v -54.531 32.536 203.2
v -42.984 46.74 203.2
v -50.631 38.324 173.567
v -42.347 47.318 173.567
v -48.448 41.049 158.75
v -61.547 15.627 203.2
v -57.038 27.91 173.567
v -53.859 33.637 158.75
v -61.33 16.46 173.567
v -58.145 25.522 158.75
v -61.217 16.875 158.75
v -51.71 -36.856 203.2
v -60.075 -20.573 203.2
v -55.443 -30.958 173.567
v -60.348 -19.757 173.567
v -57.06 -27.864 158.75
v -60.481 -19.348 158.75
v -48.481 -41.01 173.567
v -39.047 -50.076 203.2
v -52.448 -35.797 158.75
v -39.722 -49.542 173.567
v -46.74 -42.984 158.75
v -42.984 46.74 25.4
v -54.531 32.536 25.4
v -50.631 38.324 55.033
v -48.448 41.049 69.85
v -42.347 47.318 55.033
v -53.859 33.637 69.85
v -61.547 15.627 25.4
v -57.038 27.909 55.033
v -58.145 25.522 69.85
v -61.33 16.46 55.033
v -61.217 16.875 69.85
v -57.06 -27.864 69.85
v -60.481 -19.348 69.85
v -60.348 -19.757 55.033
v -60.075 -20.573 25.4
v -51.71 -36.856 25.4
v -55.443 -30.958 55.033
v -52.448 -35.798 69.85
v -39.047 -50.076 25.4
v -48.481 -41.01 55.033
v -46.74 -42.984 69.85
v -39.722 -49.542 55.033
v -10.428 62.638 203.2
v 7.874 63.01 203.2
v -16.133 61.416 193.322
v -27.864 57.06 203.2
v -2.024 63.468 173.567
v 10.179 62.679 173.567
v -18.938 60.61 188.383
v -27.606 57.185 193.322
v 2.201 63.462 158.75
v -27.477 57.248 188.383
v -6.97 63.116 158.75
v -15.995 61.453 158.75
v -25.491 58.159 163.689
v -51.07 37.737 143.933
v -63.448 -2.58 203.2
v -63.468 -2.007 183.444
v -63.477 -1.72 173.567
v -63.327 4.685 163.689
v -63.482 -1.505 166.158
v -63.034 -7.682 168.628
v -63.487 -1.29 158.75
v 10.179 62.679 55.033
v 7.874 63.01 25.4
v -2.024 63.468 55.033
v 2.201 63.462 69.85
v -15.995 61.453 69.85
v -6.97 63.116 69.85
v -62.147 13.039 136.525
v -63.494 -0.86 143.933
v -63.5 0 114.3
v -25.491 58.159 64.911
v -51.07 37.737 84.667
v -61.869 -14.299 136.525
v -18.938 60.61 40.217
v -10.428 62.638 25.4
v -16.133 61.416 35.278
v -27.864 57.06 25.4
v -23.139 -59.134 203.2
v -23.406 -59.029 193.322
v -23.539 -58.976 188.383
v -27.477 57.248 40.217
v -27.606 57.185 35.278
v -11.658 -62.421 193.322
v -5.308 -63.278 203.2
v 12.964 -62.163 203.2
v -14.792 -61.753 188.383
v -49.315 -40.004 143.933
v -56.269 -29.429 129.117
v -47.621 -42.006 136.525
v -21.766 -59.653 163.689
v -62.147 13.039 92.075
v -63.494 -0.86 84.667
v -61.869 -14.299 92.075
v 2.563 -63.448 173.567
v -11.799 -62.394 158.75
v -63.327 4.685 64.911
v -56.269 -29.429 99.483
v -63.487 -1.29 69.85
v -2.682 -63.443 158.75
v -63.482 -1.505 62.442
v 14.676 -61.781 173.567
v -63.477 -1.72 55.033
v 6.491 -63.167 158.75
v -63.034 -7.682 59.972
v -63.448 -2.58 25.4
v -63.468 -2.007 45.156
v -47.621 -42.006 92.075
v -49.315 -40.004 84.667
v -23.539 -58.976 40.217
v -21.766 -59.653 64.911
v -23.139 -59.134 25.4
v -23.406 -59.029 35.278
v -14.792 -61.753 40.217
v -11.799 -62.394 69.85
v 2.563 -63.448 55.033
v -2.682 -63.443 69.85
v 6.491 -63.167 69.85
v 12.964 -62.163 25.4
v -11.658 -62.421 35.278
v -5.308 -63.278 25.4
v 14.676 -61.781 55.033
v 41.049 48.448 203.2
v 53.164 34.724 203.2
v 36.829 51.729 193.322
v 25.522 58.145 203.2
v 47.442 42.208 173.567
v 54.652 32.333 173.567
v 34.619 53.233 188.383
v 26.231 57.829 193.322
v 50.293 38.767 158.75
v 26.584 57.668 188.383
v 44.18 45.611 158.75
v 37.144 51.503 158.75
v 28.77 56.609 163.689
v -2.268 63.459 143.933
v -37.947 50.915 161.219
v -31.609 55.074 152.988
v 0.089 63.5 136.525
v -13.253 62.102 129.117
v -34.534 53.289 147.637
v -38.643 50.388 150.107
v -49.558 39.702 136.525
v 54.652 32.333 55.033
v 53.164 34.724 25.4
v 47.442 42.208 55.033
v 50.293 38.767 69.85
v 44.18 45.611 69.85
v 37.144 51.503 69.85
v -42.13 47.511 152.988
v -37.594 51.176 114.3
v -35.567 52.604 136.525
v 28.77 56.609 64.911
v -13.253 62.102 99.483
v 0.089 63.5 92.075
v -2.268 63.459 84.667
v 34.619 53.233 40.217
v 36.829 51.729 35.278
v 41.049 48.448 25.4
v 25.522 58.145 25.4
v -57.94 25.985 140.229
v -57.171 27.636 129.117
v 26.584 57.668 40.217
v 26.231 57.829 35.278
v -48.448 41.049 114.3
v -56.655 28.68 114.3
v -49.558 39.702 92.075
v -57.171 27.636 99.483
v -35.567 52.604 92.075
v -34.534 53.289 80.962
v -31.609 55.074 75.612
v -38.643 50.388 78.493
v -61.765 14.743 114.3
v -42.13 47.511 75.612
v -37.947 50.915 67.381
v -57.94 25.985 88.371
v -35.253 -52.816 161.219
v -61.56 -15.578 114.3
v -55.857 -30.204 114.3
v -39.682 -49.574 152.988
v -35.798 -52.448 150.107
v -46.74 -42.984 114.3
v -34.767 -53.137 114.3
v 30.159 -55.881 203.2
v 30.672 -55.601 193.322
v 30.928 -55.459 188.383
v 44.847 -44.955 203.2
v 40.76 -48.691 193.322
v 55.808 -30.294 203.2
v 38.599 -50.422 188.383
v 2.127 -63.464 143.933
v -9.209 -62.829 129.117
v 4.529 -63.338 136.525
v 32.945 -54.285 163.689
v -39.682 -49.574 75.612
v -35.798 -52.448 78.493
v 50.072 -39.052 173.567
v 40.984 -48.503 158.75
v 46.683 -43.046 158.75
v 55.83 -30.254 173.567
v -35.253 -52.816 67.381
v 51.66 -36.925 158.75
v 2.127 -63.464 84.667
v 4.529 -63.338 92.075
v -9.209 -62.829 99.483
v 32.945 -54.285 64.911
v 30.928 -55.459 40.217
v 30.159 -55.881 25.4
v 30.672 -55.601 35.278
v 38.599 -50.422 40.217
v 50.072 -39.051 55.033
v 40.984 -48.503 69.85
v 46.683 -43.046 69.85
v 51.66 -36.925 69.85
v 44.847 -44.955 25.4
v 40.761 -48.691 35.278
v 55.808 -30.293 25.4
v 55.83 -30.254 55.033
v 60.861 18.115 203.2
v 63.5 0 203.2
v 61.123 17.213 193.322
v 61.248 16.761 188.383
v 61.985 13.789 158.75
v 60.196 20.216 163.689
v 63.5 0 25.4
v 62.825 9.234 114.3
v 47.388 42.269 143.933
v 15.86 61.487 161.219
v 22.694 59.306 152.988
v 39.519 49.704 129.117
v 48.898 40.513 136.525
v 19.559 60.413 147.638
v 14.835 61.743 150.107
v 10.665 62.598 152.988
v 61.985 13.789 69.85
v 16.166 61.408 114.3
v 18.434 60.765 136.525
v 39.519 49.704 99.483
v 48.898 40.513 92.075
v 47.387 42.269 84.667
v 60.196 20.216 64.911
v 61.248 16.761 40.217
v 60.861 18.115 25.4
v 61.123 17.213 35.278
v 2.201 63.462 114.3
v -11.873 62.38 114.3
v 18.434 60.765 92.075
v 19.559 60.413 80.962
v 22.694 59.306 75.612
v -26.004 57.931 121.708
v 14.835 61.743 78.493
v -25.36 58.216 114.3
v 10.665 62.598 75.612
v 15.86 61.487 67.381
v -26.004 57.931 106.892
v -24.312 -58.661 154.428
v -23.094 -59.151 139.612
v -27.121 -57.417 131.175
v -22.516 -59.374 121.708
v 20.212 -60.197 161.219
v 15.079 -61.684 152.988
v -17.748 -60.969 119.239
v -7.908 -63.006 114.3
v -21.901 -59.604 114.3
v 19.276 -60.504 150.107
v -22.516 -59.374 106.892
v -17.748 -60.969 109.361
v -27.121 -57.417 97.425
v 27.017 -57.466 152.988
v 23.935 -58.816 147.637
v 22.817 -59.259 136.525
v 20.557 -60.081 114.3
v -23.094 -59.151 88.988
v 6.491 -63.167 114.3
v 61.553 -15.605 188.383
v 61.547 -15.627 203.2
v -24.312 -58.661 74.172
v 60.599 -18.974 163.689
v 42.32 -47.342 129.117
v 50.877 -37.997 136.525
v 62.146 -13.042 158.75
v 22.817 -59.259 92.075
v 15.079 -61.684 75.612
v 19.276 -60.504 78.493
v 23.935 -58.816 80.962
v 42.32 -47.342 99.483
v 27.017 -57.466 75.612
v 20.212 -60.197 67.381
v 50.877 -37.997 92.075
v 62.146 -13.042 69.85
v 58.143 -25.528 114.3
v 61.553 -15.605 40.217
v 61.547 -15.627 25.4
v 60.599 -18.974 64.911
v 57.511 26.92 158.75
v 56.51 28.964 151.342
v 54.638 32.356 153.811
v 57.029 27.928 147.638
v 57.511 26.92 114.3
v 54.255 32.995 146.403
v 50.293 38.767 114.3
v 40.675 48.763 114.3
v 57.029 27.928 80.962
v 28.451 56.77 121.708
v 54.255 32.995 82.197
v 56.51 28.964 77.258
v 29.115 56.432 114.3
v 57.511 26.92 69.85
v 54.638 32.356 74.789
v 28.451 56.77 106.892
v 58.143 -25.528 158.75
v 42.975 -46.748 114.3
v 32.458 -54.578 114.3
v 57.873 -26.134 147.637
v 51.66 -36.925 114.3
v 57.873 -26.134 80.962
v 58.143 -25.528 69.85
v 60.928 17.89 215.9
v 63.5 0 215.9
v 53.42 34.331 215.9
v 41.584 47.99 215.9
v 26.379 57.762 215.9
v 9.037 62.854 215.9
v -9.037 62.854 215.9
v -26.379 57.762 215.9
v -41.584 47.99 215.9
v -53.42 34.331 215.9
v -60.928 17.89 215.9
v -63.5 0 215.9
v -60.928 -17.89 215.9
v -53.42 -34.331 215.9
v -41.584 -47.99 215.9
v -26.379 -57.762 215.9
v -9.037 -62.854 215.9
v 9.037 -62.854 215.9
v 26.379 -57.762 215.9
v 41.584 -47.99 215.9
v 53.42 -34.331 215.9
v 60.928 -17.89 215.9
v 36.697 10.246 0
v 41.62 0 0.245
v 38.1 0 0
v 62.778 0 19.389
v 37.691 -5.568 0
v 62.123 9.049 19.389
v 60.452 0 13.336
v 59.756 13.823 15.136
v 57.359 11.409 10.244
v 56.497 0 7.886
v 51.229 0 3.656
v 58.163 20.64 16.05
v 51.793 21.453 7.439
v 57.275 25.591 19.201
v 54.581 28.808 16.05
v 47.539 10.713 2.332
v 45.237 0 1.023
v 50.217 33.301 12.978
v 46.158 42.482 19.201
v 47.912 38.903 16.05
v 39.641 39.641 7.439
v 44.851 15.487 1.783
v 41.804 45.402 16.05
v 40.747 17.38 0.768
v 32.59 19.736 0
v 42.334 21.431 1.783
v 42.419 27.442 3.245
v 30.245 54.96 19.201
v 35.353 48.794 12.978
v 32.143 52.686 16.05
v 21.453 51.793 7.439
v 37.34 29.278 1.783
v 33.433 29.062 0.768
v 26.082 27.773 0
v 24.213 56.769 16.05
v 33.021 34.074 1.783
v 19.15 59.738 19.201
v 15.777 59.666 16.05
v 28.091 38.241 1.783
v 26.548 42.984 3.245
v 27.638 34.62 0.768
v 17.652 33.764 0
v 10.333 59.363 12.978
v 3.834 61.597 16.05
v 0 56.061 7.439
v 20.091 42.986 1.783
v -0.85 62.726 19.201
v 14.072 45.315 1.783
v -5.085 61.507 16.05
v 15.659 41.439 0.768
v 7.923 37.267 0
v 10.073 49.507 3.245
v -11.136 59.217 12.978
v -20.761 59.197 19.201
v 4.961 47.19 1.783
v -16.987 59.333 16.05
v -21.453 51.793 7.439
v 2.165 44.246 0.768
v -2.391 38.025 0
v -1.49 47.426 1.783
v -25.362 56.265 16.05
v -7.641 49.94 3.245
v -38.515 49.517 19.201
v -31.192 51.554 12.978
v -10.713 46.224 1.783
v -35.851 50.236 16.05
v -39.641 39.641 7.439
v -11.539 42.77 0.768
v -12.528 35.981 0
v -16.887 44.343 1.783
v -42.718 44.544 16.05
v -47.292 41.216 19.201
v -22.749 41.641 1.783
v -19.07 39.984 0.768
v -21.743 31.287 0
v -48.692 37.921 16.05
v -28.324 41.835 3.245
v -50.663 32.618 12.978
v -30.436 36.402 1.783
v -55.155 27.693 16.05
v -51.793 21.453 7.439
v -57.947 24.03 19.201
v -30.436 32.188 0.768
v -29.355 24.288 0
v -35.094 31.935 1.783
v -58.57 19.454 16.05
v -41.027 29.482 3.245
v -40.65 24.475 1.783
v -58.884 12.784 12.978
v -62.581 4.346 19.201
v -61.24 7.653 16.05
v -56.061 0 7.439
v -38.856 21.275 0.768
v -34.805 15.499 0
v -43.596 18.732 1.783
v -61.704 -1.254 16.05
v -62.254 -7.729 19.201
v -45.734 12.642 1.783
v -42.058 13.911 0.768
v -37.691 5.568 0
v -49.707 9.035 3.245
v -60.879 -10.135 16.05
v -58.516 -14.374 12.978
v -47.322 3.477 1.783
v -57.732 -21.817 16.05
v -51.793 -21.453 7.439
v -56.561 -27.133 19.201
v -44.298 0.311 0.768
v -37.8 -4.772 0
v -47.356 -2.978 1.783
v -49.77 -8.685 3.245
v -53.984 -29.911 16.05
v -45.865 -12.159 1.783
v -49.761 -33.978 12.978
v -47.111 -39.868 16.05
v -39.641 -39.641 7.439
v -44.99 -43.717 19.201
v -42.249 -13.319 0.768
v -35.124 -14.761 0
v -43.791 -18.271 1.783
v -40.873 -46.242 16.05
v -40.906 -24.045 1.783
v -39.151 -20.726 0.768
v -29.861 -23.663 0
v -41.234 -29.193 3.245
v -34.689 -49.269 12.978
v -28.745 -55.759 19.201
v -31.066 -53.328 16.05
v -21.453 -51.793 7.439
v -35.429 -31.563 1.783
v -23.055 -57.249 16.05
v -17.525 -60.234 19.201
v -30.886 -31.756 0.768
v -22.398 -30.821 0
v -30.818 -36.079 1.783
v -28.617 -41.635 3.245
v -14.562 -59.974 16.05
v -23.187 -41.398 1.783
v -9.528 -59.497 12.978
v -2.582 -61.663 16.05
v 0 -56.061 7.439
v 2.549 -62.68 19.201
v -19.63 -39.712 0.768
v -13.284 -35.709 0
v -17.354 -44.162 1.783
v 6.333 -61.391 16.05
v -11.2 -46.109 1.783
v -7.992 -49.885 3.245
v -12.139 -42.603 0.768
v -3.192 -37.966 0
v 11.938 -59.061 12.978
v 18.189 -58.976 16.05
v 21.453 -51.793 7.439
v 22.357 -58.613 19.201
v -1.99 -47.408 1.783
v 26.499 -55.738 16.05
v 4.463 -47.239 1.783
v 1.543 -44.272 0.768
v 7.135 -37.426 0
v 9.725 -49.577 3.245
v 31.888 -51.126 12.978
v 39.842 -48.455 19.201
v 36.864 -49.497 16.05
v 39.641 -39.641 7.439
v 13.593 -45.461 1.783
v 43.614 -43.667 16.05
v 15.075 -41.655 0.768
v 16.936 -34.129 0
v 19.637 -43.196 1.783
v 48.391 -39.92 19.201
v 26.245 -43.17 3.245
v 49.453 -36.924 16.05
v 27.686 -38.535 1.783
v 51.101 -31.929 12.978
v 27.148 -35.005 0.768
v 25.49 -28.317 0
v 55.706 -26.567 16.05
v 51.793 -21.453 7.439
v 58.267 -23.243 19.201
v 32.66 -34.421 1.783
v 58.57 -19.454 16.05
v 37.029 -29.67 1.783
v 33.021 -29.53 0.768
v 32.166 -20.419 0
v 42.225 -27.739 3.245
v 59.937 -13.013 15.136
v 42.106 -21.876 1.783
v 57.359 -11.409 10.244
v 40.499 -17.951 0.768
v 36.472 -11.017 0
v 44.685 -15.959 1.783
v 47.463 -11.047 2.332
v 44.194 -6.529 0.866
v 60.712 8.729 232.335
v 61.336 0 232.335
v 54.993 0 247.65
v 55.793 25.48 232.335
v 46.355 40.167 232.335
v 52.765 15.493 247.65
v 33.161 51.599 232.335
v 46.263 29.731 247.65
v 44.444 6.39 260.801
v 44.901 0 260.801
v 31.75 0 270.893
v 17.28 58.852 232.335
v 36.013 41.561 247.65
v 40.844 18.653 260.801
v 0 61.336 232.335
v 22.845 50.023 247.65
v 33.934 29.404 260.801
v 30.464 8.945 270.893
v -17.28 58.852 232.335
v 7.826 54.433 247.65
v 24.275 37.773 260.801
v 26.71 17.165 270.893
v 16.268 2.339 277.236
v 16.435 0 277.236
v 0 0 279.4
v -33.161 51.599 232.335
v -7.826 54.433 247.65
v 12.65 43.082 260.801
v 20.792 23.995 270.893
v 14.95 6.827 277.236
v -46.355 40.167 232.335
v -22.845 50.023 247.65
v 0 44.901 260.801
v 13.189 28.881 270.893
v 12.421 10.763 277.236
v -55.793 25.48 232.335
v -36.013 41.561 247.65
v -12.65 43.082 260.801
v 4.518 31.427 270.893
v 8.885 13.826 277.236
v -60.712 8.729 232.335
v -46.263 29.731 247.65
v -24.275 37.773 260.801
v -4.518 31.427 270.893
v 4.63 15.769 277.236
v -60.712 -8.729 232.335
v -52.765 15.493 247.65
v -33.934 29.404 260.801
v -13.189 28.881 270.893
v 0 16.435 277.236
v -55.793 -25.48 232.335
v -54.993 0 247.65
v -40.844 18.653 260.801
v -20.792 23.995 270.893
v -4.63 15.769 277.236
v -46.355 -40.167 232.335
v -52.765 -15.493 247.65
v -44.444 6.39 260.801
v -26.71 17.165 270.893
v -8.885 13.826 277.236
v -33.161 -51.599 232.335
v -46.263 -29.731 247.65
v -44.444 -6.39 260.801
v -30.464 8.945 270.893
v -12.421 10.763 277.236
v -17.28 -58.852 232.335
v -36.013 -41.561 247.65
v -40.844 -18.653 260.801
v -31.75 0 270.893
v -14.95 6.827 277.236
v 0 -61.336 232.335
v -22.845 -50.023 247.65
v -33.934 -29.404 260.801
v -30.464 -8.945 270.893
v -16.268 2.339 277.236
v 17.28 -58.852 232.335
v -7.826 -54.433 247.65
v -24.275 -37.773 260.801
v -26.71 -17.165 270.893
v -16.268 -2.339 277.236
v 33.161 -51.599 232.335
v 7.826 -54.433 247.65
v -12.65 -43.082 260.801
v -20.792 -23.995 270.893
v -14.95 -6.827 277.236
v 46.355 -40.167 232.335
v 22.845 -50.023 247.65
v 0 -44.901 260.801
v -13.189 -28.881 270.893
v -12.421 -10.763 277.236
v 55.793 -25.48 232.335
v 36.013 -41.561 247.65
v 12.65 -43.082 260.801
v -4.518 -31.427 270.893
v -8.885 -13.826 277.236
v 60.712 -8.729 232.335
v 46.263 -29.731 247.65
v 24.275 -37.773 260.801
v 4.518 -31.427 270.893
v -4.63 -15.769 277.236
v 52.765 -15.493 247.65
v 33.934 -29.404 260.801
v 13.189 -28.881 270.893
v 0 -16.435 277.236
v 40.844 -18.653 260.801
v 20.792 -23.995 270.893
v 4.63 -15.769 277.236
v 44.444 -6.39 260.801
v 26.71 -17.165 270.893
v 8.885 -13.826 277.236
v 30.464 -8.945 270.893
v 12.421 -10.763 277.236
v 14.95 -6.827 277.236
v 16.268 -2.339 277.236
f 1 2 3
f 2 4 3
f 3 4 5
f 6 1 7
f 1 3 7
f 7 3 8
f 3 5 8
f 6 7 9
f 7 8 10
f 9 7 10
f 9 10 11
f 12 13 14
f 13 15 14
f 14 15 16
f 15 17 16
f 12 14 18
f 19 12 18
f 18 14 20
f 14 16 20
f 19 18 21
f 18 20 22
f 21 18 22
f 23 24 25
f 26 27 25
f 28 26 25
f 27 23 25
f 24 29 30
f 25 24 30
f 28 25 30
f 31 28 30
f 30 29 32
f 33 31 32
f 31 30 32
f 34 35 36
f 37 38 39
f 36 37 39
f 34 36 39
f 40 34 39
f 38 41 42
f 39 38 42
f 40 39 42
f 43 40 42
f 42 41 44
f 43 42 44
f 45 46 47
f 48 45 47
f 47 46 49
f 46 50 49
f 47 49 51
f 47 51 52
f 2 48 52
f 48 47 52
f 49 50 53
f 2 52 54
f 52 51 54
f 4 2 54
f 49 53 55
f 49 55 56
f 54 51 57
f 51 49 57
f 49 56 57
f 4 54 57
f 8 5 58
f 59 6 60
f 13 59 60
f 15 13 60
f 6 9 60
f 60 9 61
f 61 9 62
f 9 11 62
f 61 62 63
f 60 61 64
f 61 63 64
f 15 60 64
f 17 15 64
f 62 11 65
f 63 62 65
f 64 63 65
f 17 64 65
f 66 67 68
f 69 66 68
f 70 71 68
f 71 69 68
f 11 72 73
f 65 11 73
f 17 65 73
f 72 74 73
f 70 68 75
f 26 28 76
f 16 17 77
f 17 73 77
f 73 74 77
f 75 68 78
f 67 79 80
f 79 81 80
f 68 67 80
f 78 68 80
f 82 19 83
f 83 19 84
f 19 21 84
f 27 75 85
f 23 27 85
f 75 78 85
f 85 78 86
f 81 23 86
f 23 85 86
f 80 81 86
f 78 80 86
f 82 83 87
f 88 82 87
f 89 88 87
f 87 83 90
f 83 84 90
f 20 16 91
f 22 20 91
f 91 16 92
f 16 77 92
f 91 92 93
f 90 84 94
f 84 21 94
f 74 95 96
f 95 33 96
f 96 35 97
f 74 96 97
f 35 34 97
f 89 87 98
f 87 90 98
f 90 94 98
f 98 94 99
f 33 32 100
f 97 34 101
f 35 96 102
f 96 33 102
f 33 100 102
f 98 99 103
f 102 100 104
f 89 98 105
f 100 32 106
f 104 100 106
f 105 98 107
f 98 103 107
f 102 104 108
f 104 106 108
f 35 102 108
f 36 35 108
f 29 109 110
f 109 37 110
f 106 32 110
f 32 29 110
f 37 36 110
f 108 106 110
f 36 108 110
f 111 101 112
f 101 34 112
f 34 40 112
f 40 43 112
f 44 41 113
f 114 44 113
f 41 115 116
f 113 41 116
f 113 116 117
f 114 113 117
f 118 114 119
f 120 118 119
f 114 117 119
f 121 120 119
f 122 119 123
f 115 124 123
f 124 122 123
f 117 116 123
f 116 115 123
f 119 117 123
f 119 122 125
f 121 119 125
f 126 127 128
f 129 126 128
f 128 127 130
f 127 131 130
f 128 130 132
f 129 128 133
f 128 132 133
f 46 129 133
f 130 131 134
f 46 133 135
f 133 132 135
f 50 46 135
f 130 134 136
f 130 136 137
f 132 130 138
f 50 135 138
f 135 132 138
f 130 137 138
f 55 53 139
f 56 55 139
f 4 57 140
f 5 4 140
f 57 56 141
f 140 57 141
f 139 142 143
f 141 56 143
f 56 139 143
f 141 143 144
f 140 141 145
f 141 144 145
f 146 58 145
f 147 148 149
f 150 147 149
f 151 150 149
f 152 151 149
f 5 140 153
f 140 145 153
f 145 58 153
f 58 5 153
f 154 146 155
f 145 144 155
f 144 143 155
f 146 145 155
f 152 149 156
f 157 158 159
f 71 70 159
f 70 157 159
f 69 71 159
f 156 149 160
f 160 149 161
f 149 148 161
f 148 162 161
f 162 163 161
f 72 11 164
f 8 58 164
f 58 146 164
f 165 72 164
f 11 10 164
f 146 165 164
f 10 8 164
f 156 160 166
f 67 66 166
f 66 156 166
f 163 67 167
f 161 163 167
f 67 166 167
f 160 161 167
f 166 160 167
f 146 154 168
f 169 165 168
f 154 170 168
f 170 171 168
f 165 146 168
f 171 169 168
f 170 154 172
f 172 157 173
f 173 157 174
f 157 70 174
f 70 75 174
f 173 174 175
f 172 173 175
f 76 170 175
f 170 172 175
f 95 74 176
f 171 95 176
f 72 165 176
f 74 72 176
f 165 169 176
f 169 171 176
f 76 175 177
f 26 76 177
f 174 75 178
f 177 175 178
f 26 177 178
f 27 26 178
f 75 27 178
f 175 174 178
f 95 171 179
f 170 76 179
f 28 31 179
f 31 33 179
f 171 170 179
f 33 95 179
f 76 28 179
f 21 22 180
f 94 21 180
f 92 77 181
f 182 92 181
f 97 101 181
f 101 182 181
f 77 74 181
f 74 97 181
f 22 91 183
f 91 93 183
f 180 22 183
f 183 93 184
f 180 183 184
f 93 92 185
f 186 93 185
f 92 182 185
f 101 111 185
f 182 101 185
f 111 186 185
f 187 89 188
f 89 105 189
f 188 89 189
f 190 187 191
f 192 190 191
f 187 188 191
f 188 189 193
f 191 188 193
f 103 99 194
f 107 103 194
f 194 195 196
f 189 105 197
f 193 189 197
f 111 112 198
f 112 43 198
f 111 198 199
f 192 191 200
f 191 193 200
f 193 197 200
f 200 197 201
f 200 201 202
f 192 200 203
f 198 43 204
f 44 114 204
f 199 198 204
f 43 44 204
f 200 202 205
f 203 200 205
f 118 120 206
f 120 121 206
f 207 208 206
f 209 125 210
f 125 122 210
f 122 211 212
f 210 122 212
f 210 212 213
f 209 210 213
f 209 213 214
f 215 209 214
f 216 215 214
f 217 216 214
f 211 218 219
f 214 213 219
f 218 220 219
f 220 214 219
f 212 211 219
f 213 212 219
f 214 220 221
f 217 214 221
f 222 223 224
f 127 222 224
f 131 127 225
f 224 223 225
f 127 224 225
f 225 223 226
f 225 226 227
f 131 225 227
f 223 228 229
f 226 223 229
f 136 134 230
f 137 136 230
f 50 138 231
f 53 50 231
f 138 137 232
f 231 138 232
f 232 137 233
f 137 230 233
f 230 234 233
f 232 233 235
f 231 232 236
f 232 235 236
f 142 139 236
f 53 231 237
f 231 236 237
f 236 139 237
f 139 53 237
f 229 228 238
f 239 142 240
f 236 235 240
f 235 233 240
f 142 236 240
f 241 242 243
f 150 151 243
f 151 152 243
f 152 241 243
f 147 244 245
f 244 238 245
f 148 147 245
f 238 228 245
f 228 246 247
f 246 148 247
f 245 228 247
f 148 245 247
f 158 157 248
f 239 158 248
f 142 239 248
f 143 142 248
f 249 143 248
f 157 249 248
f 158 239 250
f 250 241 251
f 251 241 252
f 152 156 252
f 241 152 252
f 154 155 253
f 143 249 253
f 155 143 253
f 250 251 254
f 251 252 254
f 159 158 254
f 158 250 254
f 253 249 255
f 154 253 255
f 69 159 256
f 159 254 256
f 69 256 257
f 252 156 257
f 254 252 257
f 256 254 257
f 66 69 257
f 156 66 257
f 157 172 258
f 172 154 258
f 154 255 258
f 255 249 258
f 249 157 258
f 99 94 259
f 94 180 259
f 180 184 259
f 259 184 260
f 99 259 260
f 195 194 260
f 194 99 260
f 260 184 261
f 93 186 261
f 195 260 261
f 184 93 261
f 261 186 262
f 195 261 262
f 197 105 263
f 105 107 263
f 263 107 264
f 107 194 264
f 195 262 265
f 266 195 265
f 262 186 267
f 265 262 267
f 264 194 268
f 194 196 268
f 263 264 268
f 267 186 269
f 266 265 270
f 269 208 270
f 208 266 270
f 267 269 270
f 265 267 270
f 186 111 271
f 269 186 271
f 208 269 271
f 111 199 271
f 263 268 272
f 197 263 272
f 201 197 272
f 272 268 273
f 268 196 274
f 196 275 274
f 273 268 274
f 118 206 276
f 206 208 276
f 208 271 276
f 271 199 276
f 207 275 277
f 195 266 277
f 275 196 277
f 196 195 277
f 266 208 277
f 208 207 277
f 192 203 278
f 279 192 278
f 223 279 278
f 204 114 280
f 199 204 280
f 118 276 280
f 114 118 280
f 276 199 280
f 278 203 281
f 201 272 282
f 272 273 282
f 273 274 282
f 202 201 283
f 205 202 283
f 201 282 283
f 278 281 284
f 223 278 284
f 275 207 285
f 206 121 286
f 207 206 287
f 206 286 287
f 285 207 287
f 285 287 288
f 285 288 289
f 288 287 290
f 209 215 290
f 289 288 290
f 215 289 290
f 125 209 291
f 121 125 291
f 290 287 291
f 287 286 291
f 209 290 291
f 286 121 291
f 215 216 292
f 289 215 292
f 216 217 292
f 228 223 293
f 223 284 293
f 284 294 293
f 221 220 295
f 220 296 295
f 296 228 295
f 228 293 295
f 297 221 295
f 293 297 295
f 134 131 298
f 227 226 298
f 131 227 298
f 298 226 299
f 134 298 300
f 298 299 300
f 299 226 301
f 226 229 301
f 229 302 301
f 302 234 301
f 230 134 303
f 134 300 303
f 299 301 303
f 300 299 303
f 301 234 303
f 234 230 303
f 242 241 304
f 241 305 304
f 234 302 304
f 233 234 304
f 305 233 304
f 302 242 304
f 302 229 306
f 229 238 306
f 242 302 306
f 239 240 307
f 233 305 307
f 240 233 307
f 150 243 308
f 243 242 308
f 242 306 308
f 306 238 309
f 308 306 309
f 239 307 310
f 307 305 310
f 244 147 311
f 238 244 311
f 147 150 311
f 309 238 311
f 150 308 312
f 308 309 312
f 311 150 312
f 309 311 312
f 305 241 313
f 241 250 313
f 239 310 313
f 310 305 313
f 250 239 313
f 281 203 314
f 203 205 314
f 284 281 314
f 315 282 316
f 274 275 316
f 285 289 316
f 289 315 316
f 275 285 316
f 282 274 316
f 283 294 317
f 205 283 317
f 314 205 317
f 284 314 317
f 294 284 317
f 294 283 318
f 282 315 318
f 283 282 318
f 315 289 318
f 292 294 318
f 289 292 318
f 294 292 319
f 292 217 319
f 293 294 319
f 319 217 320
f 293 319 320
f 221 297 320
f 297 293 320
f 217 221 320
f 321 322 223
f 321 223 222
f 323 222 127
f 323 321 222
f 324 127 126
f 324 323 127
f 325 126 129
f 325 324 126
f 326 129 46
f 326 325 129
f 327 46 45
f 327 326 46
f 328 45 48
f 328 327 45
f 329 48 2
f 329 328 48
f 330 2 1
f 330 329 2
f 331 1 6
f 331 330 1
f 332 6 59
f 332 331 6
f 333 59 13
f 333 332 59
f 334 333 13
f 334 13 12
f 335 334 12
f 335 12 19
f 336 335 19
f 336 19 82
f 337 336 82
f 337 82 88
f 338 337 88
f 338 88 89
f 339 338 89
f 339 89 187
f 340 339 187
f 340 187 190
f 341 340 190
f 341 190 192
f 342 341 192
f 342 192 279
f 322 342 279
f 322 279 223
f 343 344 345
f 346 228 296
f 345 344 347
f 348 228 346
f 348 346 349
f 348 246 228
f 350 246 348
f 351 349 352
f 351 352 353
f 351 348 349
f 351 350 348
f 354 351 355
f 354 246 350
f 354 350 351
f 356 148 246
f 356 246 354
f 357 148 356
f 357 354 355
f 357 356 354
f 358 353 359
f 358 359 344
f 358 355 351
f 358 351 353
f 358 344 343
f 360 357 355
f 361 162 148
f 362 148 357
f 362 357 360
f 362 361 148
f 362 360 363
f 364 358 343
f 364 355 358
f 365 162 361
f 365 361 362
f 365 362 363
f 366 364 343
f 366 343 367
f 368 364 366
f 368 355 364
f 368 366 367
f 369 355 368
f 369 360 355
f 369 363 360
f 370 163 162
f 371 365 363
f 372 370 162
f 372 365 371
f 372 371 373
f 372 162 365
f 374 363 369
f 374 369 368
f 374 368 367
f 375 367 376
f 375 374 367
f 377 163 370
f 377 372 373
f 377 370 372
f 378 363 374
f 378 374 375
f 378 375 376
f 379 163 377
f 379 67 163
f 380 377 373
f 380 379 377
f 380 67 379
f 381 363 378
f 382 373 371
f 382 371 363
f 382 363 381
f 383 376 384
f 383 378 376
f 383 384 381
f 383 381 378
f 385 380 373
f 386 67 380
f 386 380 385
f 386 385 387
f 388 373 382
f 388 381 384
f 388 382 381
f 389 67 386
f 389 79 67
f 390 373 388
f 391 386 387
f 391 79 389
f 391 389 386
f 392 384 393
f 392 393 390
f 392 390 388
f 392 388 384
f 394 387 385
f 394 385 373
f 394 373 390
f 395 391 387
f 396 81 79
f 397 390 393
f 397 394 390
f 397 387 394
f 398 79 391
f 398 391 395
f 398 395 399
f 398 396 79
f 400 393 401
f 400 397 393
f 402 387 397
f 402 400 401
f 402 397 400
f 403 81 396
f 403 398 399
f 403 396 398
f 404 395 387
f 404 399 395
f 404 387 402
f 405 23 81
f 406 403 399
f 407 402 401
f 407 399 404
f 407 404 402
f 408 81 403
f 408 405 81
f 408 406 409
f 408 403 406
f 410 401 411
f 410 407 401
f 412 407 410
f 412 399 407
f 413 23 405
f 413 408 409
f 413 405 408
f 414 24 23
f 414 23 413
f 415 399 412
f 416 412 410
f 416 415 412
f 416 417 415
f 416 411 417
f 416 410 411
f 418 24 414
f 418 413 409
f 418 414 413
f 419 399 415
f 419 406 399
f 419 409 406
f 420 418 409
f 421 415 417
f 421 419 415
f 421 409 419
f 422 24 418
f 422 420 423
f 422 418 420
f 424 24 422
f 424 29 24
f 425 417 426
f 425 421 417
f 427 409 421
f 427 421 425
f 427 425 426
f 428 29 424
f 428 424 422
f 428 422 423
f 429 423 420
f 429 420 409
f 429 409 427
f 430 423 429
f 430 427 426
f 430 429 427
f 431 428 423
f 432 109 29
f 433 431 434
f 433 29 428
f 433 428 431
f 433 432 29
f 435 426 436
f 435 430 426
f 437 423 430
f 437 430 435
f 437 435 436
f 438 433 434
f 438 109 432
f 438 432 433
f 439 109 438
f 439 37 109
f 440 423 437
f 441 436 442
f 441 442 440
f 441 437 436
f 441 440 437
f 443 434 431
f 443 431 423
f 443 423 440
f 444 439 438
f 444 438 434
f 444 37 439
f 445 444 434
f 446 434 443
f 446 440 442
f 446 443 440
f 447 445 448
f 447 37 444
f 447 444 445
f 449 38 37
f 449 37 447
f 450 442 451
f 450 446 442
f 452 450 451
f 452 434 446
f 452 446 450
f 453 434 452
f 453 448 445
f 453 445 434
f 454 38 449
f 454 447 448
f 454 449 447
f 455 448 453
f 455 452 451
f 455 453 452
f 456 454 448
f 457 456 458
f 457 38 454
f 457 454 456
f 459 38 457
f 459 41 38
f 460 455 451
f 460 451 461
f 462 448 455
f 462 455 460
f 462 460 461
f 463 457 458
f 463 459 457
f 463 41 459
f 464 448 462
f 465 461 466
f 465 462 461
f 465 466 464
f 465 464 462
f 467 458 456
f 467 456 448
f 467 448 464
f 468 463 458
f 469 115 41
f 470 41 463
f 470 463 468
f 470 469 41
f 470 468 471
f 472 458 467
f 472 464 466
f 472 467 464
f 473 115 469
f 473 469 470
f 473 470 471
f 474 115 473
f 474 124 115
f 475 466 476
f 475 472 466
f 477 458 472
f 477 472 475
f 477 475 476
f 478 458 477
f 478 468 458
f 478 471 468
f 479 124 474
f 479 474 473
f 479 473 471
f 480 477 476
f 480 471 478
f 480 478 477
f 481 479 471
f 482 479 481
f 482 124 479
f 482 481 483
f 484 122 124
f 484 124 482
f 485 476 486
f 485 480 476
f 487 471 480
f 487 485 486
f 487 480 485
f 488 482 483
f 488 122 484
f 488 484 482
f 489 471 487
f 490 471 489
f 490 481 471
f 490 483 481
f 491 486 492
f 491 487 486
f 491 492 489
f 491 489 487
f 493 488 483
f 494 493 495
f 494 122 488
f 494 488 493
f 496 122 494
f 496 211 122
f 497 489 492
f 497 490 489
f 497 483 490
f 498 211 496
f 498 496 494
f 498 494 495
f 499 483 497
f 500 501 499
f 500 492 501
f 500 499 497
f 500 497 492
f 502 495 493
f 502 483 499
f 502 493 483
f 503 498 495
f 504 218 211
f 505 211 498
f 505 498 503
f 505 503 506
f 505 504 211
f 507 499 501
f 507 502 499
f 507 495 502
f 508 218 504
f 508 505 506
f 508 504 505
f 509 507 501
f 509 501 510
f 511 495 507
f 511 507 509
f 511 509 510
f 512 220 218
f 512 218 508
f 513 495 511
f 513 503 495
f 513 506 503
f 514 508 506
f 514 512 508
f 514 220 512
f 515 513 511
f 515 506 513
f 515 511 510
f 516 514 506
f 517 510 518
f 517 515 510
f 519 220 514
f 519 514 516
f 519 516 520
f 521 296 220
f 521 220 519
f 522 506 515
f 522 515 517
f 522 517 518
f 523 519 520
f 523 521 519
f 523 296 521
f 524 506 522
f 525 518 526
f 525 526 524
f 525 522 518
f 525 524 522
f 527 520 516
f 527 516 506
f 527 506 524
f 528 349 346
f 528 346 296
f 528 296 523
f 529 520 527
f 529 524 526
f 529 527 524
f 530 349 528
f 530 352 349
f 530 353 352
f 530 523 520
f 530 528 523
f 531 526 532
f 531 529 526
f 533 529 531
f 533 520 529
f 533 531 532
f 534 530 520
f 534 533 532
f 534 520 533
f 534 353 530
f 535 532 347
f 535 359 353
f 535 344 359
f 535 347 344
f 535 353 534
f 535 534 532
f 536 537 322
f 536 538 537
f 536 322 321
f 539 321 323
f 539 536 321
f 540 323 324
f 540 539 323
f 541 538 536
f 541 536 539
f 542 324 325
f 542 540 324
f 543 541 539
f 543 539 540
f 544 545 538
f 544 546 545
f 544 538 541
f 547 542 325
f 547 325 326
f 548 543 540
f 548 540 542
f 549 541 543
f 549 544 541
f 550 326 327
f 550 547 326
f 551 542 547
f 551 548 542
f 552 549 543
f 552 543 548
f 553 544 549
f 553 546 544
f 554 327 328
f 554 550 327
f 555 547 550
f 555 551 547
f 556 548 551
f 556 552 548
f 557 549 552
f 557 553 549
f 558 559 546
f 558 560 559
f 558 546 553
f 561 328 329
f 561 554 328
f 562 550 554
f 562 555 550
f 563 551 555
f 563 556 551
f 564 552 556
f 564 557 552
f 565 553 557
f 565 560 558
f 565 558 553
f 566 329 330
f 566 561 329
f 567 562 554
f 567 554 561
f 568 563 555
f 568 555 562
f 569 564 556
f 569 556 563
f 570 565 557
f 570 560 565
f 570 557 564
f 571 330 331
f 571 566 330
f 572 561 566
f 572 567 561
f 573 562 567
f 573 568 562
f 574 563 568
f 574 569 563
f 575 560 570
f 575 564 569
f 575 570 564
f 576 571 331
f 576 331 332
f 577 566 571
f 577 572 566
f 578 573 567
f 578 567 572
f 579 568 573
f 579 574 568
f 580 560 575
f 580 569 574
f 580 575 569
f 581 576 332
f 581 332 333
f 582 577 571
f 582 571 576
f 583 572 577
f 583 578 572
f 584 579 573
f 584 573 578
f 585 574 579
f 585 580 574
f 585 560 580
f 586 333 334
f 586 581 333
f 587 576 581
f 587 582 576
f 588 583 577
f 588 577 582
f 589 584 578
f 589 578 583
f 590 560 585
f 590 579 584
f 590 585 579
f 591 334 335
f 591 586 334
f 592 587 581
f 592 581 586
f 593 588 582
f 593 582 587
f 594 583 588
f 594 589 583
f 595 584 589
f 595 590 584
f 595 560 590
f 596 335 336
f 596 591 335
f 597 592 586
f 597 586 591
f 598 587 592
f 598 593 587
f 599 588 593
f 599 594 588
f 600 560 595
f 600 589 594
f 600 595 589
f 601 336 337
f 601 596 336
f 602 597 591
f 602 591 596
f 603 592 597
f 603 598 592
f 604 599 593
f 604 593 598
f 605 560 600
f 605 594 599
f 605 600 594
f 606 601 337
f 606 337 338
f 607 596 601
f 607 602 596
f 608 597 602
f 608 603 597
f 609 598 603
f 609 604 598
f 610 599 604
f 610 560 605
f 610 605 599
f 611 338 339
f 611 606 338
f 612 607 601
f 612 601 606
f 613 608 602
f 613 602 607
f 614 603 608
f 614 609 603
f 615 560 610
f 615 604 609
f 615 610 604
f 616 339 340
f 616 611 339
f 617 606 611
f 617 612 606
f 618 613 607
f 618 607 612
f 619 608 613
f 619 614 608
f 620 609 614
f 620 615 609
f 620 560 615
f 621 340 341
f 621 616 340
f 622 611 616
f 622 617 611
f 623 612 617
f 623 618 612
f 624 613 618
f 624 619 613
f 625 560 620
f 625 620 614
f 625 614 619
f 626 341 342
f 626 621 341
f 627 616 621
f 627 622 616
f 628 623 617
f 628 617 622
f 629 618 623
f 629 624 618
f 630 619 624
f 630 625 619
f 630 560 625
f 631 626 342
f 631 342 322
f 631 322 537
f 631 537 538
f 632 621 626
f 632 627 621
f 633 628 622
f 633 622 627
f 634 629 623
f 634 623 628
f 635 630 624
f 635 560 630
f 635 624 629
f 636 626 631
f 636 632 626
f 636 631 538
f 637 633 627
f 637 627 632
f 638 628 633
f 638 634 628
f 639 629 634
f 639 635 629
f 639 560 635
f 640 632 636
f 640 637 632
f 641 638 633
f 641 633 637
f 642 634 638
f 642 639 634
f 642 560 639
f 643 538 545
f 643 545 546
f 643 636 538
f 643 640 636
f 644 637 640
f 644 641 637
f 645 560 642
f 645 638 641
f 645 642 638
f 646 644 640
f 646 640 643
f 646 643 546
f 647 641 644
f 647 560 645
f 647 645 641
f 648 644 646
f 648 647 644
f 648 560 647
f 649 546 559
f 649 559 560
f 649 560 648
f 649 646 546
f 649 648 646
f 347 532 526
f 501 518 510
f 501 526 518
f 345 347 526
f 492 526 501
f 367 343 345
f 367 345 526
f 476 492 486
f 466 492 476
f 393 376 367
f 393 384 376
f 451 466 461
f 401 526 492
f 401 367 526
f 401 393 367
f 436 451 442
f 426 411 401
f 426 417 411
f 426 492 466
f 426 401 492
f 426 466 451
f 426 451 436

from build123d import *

# Parameters (mm, degrees)
F4_R  = 63.5
F2_R  = 63.5
F0_R  = 63.5
F6_R  = 25.4
F8_R  = 63.5
F10_R = 63.5


with BuildPart() as f5:
    # F4 (on offset) → F5 section 0
    with BuildSketch(Plane.XY.offset(203.2)):
        Circle(F4_R)
    # F2 (on offset) → F5 section 1
    with BuildSketch(Plane.XY.offset(101.6)):
        Circle(F2_R)
    # F0 (on Top) → F5 section 2
    with BuildSketch(Plane.XY):
        Circle(F0_R)
    loft()

    # F6
    f6_edges = [f5.edges().sort_by_distance(p)[0] for p in [
        (-63.5, 0, 0),
    ]]
    fillet(f6_edges, radius=F6_R)

    # F4 (on offset) → F9 section 0
    with BuildSketch(Plane.XY.offset(203.2)):
        Circle(F4_R)
    # F8 (on offset) → F9 section 1
    with BuildSketch(Plane.XY.offset(279.4)):
        Circle(F8_R)
    loft()

    # F10
    f10_edges = [f5.edges().sort_by_distance(p)[0] for p in [
        (-63.5, 0, 279.4),
    ]]
    fillet(f10_edges, radius=F10_R)


solid = f5.part
